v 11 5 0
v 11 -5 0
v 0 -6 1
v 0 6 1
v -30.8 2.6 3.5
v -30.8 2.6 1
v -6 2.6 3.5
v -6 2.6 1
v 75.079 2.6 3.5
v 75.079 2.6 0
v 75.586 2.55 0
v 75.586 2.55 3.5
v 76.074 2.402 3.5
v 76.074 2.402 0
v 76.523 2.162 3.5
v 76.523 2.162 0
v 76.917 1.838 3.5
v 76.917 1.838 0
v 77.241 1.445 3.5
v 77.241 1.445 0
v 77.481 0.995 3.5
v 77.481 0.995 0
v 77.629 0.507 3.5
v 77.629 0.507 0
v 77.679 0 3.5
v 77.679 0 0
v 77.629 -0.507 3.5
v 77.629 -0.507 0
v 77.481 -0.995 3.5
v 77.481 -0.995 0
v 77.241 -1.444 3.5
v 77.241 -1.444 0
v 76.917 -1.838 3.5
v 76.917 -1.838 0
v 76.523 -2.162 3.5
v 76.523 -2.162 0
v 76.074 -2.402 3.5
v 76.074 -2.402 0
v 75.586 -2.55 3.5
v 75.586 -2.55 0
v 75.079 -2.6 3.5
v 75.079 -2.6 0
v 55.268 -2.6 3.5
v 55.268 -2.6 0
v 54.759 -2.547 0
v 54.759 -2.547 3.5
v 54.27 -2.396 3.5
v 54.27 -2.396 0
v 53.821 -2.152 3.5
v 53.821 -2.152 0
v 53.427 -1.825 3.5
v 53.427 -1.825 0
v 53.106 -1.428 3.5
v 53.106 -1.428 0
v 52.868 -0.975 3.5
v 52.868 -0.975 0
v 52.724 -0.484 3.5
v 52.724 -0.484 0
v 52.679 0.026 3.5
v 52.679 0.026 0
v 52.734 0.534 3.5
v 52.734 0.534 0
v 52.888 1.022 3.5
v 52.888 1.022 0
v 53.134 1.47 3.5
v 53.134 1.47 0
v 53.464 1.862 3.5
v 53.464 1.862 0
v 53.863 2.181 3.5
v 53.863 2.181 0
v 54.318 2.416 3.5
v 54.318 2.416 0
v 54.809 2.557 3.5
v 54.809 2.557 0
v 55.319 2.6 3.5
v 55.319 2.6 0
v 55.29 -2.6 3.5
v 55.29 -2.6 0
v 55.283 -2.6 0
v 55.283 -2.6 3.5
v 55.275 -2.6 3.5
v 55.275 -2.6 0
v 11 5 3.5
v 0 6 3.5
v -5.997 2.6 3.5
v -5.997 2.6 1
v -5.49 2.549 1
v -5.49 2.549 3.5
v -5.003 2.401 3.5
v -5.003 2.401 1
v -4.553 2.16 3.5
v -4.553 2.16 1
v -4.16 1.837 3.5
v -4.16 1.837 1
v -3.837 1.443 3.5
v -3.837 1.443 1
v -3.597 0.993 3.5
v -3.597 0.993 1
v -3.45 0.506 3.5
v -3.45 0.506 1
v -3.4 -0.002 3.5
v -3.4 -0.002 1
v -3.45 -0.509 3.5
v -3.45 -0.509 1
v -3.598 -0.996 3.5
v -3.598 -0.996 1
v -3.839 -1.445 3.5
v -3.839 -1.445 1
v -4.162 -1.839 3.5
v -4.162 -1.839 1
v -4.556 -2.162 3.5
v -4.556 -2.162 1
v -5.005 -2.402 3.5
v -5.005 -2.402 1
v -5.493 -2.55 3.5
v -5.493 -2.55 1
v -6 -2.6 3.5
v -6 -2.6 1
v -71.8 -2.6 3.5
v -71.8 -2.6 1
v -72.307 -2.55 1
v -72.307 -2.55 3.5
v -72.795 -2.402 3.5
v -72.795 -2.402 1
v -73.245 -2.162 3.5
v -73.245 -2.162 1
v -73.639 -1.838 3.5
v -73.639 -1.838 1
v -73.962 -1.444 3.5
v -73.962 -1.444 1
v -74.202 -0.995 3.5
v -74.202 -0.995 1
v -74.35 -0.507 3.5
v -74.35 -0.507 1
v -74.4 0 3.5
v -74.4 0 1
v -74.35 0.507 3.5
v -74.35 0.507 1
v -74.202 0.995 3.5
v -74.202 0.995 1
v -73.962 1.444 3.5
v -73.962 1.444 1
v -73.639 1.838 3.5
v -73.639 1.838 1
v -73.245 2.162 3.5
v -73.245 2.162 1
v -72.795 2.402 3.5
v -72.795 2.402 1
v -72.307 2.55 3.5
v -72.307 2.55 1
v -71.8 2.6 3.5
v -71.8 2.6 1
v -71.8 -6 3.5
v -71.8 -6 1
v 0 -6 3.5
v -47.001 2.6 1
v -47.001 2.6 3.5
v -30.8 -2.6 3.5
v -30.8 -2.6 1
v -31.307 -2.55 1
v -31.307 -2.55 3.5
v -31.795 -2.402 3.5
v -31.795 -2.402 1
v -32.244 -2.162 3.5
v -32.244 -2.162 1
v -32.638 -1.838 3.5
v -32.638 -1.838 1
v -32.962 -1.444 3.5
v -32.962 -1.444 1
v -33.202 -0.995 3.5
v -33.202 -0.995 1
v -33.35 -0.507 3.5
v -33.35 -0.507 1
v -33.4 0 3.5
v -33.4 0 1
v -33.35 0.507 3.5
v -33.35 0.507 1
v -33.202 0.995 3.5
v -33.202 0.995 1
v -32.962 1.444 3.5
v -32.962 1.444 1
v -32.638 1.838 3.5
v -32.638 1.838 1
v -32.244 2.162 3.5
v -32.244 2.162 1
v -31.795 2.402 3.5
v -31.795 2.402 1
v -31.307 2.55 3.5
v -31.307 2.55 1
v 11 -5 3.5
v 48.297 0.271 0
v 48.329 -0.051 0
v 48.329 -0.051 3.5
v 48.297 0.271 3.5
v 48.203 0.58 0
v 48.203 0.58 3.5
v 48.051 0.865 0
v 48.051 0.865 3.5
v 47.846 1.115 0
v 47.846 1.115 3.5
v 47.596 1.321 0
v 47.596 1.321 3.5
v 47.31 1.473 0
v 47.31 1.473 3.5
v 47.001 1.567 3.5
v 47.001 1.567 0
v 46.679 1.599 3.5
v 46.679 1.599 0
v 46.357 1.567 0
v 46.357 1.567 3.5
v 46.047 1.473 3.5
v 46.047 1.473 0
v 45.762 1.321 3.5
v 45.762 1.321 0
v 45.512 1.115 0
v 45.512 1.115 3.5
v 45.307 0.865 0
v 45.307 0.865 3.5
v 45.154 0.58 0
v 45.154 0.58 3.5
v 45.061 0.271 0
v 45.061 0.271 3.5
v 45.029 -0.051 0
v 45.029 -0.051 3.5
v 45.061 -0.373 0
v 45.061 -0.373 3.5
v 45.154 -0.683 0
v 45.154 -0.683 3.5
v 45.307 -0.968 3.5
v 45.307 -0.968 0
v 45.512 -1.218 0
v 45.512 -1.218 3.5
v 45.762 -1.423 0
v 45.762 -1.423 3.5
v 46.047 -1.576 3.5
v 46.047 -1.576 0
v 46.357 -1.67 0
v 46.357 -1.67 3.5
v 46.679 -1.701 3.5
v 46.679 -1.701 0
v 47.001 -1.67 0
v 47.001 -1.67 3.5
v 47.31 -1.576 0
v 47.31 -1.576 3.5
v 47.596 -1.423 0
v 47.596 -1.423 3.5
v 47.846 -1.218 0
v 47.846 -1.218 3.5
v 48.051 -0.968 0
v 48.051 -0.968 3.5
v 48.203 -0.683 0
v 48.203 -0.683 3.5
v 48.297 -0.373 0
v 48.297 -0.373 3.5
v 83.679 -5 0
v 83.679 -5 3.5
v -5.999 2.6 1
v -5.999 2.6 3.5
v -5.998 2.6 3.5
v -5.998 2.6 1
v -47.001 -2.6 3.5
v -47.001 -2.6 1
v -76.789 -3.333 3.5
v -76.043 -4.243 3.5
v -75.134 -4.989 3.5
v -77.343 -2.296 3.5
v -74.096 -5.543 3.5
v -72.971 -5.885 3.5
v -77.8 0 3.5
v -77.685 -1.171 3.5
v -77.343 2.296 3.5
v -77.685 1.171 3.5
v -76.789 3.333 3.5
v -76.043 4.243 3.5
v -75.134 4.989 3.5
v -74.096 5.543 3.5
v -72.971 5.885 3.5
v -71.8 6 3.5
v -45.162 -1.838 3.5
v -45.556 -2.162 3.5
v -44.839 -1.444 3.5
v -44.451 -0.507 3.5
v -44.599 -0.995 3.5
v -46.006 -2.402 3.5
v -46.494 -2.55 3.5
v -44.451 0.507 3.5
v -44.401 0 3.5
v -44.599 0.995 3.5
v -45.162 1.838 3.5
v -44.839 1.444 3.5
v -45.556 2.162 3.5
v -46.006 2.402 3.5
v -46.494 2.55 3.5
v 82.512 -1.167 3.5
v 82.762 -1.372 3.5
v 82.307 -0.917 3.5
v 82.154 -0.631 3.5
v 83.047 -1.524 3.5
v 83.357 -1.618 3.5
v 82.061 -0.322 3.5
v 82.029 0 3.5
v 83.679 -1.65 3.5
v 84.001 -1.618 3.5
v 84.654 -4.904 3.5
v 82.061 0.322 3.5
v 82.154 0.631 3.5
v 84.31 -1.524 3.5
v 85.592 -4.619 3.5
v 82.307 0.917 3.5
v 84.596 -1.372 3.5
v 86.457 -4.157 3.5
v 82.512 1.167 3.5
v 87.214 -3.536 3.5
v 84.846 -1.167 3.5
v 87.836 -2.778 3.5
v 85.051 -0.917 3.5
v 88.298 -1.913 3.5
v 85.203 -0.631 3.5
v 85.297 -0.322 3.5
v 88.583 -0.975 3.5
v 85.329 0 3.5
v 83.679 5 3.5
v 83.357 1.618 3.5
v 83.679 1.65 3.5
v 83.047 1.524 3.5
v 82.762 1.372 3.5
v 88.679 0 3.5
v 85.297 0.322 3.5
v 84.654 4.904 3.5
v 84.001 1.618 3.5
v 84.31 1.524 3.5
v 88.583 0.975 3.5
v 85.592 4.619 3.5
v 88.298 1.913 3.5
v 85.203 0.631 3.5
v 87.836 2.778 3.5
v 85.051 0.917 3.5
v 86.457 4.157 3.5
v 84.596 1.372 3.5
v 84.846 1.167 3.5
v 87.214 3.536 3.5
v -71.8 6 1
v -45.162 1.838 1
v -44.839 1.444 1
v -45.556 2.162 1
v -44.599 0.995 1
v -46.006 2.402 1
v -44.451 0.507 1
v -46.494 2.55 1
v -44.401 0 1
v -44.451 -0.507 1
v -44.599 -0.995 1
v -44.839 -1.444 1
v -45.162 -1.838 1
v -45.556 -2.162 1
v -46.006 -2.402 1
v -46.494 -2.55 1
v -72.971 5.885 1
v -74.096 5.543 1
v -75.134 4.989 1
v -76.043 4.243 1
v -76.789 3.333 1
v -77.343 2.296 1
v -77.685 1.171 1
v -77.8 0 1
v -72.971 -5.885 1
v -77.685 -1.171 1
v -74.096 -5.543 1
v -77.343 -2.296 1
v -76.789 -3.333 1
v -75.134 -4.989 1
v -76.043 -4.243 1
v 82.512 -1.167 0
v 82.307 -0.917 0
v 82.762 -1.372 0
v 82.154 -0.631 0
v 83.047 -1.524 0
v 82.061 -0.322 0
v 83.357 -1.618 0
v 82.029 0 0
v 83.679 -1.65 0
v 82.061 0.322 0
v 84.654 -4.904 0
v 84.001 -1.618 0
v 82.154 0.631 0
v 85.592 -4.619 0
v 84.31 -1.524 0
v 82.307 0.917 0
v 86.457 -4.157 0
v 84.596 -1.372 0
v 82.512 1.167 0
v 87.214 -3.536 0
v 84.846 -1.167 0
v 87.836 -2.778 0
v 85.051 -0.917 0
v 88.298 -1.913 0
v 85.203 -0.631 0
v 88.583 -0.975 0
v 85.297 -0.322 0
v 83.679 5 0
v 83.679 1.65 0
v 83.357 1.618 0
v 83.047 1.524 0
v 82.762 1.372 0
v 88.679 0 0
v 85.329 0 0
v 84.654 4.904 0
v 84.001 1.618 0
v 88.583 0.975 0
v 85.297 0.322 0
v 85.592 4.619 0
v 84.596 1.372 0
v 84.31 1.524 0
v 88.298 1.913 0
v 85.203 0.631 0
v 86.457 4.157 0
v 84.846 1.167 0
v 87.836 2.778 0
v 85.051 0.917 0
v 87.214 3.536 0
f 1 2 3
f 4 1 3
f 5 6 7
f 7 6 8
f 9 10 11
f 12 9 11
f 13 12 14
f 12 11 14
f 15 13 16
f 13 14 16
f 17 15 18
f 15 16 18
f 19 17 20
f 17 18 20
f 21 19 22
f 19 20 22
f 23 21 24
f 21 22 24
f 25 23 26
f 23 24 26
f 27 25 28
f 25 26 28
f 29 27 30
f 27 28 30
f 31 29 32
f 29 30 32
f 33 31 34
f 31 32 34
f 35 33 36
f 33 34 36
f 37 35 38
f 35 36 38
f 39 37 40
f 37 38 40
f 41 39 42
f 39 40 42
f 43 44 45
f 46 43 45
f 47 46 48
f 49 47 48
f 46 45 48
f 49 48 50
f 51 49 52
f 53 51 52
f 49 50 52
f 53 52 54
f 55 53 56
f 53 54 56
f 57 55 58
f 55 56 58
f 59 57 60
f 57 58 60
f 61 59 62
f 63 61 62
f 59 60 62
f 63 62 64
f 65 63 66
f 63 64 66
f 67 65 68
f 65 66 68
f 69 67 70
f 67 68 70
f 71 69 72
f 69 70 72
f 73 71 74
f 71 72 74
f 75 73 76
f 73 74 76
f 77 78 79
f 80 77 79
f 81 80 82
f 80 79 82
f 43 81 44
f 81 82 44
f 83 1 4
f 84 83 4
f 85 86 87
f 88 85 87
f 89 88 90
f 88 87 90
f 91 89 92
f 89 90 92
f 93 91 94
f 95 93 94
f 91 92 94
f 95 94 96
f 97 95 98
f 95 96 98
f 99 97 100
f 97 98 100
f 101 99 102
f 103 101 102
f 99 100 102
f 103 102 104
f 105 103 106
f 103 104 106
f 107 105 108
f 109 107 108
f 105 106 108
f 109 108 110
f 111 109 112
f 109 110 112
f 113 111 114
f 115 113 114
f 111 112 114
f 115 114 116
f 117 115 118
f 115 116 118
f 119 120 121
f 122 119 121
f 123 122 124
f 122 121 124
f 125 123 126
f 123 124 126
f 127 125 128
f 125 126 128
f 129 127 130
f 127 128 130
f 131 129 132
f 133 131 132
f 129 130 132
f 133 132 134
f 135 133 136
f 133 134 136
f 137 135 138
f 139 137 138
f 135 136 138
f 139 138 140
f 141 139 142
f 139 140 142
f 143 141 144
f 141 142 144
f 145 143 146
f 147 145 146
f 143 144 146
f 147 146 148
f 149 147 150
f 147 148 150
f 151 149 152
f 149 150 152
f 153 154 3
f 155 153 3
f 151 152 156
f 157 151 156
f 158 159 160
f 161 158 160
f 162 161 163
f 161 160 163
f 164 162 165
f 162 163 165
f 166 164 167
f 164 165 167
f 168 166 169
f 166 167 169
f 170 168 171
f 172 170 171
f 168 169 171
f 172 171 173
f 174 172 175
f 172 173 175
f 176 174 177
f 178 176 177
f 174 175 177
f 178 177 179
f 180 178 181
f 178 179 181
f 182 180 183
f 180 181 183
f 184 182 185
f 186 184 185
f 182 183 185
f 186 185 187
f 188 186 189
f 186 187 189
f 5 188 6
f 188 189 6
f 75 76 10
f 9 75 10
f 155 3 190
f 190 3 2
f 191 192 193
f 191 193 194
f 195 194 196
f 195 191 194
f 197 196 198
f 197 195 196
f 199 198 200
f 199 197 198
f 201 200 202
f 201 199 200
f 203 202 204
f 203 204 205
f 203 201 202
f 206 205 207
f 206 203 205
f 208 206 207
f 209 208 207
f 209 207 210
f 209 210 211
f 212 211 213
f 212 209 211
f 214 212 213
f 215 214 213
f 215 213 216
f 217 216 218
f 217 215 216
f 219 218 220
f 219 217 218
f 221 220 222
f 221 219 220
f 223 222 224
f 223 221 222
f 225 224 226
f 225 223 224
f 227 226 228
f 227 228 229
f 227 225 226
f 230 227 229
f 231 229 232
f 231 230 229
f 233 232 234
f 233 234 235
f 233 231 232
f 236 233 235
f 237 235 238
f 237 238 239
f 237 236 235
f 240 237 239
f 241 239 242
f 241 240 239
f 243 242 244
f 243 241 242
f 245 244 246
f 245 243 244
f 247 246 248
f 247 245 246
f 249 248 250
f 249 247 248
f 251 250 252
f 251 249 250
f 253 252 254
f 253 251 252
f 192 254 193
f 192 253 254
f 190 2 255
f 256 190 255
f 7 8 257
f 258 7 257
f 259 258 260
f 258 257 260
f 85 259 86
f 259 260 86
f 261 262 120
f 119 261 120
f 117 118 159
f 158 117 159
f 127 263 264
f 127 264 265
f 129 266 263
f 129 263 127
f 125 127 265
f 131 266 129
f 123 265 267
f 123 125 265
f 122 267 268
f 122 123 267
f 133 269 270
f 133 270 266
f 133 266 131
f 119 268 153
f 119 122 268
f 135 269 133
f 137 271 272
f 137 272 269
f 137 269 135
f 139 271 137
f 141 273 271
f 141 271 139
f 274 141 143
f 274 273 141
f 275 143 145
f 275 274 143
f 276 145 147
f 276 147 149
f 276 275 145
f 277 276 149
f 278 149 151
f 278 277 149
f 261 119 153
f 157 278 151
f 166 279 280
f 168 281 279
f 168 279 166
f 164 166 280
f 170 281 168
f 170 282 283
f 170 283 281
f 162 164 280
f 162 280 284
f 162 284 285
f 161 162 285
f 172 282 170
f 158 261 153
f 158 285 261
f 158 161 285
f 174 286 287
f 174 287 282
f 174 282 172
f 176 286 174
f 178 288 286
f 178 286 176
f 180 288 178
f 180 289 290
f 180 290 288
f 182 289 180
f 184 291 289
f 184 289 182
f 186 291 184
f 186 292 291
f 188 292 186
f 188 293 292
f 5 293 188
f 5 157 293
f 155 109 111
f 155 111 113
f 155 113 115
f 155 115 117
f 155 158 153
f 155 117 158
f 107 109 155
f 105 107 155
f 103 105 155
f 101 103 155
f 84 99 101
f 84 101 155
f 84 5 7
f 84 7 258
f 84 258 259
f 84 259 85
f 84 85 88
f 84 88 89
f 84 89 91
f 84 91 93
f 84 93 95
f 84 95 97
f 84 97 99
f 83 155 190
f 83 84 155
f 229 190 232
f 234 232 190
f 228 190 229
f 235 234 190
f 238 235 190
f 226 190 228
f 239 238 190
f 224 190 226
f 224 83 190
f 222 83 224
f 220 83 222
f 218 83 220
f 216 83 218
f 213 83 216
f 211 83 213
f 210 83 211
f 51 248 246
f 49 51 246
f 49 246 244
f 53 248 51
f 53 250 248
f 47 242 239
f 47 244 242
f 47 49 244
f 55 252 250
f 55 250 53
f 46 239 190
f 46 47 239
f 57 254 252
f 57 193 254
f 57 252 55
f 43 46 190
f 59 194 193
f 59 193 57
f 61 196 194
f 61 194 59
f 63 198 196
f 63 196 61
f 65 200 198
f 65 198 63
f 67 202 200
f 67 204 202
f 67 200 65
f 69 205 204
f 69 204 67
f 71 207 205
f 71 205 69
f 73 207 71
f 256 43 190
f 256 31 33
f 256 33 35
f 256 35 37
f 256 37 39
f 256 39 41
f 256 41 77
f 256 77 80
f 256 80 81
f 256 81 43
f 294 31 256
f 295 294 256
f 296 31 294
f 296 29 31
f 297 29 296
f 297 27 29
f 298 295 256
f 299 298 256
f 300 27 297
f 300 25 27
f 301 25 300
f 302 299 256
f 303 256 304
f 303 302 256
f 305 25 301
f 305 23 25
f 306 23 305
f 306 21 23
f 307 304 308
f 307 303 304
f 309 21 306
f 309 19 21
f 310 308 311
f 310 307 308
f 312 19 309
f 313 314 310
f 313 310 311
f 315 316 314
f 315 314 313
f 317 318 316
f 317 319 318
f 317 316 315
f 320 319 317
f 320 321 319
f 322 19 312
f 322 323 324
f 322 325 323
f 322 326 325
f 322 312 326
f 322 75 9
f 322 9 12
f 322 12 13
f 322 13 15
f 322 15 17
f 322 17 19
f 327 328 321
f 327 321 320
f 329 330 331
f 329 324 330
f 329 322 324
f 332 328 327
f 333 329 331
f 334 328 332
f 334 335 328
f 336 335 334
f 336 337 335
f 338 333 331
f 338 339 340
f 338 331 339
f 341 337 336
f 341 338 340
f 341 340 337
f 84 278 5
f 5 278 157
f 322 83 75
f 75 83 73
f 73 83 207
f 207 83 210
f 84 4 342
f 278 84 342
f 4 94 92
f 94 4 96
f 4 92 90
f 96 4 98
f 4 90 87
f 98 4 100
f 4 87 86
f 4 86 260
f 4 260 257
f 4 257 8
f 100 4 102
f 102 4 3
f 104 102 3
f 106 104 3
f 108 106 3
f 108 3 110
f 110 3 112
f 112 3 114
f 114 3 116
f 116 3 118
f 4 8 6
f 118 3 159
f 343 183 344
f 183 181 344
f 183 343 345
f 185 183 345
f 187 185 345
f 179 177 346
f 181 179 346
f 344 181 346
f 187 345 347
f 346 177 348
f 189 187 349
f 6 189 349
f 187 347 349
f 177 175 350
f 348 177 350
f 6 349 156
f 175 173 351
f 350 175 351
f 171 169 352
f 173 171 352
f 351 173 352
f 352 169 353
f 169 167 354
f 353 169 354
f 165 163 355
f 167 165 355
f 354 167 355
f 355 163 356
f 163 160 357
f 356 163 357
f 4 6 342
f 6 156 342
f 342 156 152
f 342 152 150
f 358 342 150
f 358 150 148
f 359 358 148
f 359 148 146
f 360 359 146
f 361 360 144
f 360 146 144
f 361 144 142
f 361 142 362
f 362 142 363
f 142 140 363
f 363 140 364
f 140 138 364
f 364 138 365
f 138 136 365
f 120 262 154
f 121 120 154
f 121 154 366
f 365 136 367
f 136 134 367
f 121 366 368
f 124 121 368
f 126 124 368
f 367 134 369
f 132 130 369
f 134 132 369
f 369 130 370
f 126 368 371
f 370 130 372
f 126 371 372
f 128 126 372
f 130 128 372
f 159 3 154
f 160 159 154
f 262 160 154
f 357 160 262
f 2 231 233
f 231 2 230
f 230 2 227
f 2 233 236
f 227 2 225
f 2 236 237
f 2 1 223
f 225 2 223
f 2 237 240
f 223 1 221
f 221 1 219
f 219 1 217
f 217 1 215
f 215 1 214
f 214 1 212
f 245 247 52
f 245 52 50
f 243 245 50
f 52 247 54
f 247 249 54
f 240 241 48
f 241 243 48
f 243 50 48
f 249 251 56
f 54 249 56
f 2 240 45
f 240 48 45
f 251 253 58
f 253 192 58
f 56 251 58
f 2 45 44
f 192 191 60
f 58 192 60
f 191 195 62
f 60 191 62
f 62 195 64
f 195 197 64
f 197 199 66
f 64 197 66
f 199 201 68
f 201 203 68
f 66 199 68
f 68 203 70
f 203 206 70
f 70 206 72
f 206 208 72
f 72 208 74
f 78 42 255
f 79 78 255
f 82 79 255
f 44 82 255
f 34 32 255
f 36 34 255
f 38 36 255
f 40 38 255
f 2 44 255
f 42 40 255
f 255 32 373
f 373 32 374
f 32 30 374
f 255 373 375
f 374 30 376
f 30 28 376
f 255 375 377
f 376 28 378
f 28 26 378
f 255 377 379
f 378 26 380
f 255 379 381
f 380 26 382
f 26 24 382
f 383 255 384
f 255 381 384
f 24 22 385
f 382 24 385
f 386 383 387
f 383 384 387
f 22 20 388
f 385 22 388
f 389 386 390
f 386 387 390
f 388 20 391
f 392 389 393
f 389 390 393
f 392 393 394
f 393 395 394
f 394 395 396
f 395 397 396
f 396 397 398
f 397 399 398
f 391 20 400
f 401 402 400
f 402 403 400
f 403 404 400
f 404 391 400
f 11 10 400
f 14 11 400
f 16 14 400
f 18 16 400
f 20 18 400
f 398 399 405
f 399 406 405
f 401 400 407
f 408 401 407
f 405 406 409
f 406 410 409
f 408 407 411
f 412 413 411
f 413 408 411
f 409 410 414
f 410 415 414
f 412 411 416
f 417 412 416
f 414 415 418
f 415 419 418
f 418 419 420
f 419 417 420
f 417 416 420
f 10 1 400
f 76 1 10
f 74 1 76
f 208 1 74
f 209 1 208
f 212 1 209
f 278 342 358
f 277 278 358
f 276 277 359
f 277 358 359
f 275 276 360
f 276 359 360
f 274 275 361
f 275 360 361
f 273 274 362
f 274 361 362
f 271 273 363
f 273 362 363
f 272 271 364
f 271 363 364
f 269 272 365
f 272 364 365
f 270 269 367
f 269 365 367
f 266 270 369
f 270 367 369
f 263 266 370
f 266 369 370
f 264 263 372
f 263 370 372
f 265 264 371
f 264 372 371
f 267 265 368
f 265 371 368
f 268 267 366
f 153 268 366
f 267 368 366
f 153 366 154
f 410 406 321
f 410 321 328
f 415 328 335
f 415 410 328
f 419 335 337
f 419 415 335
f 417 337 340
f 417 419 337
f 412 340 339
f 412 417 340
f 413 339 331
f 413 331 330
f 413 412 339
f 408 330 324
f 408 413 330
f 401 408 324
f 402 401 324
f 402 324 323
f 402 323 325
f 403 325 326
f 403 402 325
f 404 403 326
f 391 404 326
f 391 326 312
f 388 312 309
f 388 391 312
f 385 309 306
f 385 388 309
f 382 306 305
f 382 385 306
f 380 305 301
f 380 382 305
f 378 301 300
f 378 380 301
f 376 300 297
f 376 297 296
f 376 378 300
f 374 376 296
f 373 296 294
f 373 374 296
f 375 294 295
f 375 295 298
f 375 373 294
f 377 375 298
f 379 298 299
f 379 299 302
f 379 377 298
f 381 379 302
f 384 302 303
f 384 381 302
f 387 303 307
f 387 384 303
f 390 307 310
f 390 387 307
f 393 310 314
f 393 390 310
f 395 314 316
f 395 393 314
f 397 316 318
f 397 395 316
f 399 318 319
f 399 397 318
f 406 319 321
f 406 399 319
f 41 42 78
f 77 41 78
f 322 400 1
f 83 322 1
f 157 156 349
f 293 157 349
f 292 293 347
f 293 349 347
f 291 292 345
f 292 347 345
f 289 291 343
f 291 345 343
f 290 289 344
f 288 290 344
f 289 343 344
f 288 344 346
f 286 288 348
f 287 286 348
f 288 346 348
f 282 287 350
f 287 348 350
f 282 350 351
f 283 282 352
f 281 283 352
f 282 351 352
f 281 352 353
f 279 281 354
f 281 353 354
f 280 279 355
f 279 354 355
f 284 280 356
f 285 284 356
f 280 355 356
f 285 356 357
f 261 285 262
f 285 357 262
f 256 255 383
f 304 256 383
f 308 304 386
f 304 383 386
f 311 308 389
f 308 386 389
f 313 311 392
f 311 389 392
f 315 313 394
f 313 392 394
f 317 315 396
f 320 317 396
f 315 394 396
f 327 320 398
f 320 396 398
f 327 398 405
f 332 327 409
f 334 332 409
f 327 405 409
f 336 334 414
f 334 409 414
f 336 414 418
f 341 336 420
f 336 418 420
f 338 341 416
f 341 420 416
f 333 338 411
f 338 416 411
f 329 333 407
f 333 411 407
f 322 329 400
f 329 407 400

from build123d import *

# Parameters (mm, degrees)
F0_R     = 1.65
F1_DEPTH = 3.5
F3_DEPTH = 6


with BuildPart() as f1:
    # F0 (on Top) → F1 (new body)
    with BuildSketch(Plane.XY):
        with BuildLine():
            Line((0, 6), (-71.800094, 6))
            ThreePointArc((-71.800094, 6), (-77.800094, 0), (-71.800094, -6))
            Line((-71.800094, -6), (0, -6))
            Line((0, -6), (11, -5))
            Line((11, -5), (83.678898, -5))
            ThreePointArc((83.678898, -5), (88.678898, 0), (83.678898, 5))
            Line((83.678898, 5), (11, 4.999999))
            Line((11, 4.999999), (0, 6))
        make_face()
        with Locations((46.678898, -0.051367)):
            Circle(F0_R, mode=Mode.SUBTRACT)
        with BuildLine():
            ThreePointArc((75.078858, 2.6), (77.678898, 1.9e-05), (75.078895, -2.6))
            Line((75.078895, -2.6), (55.290283, -2.599975))
            ThreePointArc((55.290283, -2.599975), (55.278895, -2.6), (55.267506, -2.599975))
            ThreePointArc((55.267506, -2.599975), (52.679025, 0.02565), (55.318805, 2.599694))
            Line((55.318805, 2.599694), (75.078858, 2.6))
        make_face(mode=Mode.SUBTRACT)
        with BuildLine():
            ThreePointArc((-71.800094, -2.6), (-74.400094, 0), (-71.800094, 2.6))
            Line((-71.800094, 2.6), (-47.000807, 2.6))
            ThreePointArc((-47.000807, 2.6), (-44.400807, 0), (-47.000807, -2.6))
            Line((-47.000807, -2.6), (-71.800094, -2.6))
        make_face(mode=Mode.SUBTRACT)
        with BuildLine():
            ThreePointArc((-30.8, -2.6), (-33.4, 0), (-30.8, 2.6))
            Line((-30.8, 2.6), (-6, 2.6))
            ThreePointArc((-6, 2.6), (-5.998491, 2.6), (-5.996982, 2.599998))
            ThreePointArc((-5.996982, 2.599998), (-3.400001, -0.001509), (-6, -2.6))
            Line((-6, -2.6), (-30.8, -2.6))
        make_face(mode=Mode.SUBTRACT)
        with Locations((83.678898, 0)):
            Circle(F0_R, mode=Mode.SUBTRACT)
    extrude(amount=F1_DEPTH)

    # F2 (on Front) → F3 (cut, symmetric)
    with BuildSketch(Plane.XZ):
        Polygon((-80.43514, 1), (-80.43514, 0), (11, 0), (0, 1), align=None)
    extrude(amount=F3_DEPTH, both=True, mode=Mode.SUBTRACT)


solid = f1.part
